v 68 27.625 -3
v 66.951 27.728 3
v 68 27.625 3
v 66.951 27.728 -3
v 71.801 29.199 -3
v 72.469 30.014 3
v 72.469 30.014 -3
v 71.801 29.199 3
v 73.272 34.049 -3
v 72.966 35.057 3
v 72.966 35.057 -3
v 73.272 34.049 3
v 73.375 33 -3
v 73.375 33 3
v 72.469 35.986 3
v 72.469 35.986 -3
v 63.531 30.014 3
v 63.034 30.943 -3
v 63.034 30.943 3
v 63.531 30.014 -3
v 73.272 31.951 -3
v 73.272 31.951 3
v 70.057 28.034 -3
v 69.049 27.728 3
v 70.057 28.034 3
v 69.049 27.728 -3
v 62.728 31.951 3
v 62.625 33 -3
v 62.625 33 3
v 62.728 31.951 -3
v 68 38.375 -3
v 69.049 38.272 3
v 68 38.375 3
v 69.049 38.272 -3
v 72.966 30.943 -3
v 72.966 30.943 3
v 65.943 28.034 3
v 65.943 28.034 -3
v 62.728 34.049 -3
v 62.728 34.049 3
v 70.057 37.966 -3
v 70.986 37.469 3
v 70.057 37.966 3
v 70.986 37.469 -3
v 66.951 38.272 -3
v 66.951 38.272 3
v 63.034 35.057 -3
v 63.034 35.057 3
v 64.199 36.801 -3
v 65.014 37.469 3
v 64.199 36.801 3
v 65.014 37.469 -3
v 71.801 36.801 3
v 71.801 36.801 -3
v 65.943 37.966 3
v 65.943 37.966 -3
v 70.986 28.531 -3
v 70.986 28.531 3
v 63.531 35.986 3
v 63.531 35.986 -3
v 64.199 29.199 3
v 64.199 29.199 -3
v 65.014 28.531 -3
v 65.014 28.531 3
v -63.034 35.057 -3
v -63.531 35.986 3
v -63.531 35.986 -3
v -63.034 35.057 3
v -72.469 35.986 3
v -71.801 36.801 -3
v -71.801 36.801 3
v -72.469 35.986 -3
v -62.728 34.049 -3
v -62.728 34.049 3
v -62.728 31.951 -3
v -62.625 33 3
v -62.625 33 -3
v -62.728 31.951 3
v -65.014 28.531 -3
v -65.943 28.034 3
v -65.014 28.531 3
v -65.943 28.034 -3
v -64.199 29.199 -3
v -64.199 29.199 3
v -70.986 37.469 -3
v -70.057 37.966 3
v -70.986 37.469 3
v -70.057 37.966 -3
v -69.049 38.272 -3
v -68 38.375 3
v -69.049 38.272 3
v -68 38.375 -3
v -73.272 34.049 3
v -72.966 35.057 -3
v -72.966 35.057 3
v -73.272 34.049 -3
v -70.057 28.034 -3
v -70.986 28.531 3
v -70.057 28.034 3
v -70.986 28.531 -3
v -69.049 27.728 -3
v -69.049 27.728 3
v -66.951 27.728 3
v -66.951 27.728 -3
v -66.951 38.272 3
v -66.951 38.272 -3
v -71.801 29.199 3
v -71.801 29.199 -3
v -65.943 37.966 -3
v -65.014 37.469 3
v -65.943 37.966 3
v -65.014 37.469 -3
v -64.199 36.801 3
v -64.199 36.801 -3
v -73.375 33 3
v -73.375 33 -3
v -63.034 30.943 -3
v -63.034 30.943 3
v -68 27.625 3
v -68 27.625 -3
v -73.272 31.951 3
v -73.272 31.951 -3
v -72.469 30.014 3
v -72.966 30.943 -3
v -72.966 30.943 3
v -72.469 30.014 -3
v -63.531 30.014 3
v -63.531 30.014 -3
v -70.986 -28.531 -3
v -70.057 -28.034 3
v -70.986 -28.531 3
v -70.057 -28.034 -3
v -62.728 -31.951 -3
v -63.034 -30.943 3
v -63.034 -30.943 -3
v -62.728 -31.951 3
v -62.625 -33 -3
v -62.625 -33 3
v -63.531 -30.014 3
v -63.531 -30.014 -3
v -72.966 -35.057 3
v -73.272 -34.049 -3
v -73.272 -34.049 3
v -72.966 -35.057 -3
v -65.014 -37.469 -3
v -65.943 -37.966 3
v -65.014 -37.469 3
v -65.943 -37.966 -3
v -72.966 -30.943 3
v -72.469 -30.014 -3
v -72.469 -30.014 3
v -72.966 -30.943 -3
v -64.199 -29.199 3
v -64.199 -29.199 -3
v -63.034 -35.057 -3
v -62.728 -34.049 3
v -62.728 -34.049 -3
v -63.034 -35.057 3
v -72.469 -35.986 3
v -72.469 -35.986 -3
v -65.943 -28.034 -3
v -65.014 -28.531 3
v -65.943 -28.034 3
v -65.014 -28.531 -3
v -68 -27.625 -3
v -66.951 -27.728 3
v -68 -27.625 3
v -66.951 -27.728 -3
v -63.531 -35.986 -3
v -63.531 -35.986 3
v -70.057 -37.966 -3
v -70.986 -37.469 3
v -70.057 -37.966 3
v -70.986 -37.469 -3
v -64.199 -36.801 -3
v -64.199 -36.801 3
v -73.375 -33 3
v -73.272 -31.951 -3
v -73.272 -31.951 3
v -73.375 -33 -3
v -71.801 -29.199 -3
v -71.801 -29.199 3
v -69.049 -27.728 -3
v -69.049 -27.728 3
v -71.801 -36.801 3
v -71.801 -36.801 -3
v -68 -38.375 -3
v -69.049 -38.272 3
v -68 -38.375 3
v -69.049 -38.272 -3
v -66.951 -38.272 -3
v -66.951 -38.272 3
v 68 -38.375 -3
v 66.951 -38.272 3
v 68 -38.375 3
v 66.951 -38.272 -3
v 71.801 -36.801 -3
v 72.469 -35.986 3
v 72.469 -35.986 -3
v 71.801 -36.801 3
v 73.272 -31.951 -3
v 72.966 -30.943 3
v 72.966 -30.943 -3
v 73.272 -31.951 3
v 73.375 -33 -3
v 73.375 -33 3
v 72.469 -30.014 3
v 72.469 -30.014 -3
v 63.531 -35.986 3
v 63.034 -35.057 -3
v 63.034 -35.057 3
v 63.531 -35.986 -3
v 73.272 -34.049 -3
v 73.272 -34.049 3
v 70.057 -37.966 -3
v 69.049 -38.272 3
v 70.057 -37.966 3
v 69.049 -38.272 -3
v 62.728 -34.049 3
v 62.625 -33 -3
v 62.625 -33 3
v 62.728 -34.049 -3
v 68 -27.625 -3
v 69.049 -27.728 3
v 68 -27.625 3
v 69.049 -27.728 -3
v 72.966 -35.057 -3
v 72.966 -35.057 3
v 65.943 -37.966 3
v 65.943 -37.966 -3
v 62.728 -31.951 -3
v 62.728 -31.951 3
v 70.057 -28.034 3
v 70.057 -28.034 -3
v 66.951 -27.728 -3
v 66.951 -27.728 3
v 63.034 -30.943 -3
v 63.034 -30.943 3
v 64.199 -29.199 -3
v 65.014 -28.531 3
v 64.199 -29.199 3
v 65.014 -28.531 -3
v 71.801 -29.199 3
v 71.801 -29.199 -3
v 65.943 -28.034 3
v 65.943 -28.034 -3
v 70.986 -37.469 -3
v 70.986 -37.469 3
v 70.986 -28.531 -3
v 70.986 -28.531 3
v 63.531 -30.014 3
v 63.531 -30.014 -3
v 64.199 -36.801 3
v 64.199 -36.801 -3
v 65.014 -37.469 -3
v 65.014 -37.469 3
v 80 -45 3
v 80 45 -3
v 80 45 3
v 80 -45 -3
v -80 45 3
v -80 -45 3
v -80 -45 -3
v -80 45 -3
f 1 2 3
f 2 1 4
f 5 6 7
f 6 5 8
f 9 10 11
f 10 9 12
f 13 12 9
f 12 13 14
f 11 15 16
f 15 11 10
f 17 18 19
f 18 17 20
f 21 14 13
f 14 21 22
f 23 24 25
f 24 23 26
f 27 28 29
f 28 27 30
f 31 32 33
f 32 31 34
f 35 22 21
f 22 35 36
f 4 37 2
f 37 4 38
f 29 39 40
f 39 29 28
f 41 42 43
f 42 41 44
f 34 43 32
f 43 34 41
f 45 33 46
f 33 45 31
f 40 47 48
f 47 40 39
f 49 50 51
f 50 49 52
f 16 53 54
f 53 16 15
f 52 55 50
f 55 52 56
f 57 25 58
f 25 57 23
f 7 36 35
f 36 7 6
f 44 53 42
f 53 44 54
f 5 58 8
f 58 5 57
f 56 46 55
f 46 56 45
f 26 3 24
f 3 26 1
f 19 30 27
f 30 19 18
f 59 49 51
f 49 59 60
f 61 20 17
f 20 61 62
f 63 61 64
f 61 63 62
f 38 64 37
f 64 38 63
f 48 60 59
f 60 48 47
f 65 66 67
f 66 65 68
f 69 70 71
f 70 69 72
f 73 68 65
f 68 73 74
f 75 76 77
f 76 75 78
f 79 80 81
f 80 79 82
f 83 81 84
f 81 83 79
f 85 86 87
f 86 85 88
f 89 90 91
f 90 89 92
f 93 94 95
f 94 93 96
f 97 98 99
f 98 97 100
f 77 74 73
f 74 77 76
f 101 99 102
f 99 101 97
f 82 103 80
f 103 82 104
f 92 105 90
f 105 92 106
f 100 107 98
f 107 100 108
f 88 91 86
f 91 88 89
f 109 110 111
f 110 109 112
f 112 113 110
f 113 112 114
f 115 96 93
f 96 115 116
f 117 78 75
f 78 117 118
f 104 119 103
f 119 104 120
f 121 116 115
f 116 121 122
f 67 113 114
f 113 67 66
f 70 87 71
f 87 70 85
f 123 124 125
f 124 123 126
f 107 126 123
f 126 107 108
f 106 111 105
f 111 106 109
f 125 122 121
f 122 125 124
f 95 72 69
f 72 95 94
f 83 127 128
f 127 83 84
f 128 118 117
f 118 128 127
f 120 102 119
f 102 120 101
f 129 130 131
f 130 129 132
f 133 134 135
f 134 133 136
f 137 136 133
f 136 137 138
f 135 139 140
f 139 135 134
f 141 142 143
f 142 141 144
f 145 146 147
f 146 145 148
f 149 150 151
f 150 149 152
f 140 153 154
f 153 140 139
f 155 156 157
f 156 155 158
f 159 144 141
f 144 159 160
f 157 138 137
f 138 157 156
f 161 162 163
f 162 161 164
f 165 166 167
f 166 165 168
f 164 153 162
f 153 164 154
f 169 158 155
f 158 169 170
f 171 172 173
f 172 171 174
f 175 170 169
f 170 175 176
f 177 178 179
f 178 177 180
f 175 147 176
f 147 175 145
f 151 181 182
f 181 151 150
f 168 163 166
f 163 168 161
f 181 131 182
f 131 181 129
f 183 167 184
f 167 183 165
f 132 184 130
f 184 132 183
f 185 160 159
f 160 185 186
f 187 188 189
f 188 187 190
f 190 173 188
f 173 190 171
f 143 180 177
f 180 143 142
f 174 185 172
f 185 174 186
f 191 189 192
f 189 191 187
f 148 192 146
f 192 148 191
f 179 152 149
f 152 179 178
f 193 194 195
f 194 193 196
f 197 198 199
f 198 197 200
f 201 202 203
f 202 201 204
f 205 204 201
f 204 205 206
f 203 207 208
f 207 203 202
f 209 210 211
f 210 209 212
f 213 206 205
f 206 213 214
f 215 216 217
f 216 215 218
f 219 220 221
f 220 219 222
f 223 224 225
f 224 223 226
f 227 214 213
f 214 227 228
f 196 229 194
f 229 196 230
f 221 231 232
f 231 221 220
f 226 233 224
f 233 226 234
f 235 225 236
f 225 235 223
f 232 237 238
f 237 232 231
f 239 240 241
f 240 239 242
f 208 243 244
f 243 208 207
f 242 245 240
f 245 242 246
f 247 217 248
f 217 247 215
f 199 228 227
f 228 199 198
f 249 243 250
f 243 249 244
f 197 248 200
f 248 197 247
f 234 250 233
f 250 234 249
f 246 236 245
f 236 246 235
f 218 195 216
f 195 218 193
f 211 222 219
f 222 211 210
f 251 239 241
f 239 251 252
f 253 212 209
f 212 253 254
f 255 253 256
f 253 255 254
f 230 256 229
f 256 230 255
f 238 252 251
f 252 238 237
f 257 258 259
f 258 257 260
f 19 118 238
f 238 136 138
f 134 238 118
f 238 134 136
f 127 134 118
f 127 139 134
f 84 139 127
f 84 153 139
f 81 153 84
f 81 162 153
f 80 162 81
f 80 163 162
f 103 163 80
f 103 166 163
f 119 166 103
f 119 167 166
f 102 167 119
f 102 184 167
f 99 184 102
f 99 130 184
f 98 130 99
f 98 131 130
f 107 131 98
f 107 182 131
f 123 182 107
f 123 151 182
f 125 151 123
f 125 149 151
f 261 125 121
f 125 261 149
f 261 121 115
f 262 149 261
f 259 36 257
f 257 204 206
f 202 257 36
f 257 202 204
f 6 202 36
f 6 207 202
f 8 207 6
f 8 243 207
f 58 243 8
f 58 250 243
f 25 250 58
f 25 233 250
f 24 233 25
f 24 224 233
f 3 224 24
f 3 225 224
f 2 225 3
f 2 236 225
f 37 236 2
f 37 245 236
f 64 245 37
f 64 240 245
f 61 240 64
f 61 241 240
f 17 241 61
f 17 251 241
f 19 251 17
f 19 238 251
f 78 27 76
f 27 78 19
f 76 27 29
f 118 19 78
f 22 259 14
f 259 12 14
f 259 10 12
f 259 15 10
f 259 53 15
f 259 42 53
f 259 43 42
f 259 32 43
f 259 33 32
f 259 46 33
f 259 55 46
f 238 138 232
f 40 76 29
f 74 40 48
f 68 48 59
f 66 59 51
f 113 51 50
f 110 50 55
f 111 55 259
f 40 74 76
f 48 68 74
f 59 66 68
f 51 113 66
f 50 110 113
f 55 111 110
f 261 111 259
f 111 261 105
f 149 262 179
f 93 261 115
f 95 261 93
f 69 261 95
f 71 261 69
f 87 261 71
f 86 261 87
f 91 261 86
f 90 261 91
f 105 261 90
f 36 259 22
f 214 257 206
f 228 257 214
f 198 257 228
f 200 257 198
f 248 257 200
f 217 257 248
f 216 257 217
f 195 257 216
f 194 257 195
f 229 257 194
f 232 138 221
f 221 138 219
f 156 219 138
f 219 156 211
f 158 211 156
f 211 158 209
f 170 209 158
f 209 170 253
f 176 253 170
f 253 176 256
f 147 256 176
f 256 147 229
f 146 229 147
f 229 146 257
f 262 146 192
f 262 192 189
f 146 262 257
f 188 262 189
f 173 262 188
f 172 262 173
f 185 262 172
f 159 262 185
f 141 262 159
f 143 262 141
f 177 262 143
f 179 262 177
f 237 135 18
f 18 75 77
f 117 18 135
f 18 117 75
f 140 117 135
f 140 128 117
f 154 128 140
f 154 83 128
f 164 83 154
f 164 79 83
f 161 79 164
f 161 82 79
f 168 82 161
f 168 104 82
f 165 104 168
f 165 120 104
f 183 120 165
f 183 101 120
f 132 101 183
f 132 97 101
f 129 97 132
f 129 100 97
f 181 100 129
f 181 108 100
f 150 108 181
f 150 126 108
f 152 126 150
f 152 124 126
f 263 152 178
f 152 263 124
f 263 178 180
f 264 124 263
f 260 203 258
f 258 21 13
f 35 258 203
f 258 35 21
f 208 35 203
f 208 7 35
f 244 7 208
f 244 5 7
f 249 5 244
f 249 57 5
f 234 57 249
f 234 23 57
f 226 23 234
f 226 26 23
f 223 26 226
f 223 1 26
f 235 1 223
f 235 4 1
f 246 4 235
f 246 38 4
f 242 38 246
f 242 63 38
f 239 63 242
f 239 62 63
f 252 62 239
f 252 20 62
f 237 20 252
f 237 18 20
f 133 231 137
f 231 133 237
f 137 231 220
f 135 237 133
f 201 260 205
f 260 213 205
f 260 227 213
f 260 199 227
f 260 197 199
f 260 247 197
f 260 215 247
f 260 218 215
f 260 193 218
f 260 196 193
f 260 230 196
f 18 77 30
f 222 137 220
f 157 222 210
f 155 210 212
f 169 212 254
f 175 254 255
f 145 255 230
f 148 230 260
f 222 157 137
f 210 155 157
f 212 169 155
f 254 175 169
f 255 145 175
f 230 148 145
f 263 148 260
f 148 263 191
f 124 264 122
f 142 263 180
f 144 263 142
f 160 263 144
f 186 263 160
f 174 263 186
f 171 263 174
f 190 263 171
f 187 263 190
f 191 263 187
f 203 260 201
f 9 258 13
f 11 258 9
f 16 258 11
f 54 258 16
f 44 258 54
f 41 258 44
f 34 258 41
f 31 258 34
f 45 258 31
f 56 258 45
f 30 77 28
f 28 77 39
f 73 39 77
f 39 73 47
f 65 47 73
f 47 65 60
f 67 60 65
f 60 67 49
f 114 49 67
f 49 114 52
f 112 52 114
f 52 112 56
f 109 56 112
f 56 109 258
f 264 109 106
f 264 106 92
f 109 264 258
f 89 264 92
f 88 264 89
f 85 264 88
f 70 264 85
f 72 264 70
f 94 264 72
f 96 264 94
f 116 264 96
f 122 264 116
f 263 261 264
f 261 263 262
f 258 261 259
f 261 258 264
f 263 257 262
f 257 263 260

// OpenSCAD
$fn = 32;

// ----------------------------------------------------------------------
// Corner plate 160 x 90 x 6
// 4 holes, centres taken from the edge offset
// ----------------------------------------------------------------------

// --- parameters (mm) ---
plate = [160, 90, 6];    // overall size (x, y, z)
holes = 4;               // number of holes the drawing asks for
bore_d = 10.5;           // nominal hole diameter from the drawing
print_allowance = 0.25;  // clearance added for printing
edge = 12;               // hole centre offset from the plate edge

// --- derived feature positions (mm) ---
hole_d = bore_d + print_allowance;  // = 10.75   hole diameter as printed
corner_x = plate[0] / 2 - edge;     // = 68   corner hole X
corner_y = plate[1] / 2 - edge;     // = 33   corner hole Y
feature_centers = [
  [corner_x, corner_y],
  [-corner_x, corner_y],
  [-corner_x, -corner_y],
  [corner_x, -corner_y]
];   // hole centres the loop below drills

// plate outline, every hole drilled through with the same cutters
difference() {
  cube(plate, center = true);
  for (centre = feature_centers)
    translate([centre[0], centre[1], 0])
      cylinder(d = hole_d, h = plate[2] + 2, center = true);
}
